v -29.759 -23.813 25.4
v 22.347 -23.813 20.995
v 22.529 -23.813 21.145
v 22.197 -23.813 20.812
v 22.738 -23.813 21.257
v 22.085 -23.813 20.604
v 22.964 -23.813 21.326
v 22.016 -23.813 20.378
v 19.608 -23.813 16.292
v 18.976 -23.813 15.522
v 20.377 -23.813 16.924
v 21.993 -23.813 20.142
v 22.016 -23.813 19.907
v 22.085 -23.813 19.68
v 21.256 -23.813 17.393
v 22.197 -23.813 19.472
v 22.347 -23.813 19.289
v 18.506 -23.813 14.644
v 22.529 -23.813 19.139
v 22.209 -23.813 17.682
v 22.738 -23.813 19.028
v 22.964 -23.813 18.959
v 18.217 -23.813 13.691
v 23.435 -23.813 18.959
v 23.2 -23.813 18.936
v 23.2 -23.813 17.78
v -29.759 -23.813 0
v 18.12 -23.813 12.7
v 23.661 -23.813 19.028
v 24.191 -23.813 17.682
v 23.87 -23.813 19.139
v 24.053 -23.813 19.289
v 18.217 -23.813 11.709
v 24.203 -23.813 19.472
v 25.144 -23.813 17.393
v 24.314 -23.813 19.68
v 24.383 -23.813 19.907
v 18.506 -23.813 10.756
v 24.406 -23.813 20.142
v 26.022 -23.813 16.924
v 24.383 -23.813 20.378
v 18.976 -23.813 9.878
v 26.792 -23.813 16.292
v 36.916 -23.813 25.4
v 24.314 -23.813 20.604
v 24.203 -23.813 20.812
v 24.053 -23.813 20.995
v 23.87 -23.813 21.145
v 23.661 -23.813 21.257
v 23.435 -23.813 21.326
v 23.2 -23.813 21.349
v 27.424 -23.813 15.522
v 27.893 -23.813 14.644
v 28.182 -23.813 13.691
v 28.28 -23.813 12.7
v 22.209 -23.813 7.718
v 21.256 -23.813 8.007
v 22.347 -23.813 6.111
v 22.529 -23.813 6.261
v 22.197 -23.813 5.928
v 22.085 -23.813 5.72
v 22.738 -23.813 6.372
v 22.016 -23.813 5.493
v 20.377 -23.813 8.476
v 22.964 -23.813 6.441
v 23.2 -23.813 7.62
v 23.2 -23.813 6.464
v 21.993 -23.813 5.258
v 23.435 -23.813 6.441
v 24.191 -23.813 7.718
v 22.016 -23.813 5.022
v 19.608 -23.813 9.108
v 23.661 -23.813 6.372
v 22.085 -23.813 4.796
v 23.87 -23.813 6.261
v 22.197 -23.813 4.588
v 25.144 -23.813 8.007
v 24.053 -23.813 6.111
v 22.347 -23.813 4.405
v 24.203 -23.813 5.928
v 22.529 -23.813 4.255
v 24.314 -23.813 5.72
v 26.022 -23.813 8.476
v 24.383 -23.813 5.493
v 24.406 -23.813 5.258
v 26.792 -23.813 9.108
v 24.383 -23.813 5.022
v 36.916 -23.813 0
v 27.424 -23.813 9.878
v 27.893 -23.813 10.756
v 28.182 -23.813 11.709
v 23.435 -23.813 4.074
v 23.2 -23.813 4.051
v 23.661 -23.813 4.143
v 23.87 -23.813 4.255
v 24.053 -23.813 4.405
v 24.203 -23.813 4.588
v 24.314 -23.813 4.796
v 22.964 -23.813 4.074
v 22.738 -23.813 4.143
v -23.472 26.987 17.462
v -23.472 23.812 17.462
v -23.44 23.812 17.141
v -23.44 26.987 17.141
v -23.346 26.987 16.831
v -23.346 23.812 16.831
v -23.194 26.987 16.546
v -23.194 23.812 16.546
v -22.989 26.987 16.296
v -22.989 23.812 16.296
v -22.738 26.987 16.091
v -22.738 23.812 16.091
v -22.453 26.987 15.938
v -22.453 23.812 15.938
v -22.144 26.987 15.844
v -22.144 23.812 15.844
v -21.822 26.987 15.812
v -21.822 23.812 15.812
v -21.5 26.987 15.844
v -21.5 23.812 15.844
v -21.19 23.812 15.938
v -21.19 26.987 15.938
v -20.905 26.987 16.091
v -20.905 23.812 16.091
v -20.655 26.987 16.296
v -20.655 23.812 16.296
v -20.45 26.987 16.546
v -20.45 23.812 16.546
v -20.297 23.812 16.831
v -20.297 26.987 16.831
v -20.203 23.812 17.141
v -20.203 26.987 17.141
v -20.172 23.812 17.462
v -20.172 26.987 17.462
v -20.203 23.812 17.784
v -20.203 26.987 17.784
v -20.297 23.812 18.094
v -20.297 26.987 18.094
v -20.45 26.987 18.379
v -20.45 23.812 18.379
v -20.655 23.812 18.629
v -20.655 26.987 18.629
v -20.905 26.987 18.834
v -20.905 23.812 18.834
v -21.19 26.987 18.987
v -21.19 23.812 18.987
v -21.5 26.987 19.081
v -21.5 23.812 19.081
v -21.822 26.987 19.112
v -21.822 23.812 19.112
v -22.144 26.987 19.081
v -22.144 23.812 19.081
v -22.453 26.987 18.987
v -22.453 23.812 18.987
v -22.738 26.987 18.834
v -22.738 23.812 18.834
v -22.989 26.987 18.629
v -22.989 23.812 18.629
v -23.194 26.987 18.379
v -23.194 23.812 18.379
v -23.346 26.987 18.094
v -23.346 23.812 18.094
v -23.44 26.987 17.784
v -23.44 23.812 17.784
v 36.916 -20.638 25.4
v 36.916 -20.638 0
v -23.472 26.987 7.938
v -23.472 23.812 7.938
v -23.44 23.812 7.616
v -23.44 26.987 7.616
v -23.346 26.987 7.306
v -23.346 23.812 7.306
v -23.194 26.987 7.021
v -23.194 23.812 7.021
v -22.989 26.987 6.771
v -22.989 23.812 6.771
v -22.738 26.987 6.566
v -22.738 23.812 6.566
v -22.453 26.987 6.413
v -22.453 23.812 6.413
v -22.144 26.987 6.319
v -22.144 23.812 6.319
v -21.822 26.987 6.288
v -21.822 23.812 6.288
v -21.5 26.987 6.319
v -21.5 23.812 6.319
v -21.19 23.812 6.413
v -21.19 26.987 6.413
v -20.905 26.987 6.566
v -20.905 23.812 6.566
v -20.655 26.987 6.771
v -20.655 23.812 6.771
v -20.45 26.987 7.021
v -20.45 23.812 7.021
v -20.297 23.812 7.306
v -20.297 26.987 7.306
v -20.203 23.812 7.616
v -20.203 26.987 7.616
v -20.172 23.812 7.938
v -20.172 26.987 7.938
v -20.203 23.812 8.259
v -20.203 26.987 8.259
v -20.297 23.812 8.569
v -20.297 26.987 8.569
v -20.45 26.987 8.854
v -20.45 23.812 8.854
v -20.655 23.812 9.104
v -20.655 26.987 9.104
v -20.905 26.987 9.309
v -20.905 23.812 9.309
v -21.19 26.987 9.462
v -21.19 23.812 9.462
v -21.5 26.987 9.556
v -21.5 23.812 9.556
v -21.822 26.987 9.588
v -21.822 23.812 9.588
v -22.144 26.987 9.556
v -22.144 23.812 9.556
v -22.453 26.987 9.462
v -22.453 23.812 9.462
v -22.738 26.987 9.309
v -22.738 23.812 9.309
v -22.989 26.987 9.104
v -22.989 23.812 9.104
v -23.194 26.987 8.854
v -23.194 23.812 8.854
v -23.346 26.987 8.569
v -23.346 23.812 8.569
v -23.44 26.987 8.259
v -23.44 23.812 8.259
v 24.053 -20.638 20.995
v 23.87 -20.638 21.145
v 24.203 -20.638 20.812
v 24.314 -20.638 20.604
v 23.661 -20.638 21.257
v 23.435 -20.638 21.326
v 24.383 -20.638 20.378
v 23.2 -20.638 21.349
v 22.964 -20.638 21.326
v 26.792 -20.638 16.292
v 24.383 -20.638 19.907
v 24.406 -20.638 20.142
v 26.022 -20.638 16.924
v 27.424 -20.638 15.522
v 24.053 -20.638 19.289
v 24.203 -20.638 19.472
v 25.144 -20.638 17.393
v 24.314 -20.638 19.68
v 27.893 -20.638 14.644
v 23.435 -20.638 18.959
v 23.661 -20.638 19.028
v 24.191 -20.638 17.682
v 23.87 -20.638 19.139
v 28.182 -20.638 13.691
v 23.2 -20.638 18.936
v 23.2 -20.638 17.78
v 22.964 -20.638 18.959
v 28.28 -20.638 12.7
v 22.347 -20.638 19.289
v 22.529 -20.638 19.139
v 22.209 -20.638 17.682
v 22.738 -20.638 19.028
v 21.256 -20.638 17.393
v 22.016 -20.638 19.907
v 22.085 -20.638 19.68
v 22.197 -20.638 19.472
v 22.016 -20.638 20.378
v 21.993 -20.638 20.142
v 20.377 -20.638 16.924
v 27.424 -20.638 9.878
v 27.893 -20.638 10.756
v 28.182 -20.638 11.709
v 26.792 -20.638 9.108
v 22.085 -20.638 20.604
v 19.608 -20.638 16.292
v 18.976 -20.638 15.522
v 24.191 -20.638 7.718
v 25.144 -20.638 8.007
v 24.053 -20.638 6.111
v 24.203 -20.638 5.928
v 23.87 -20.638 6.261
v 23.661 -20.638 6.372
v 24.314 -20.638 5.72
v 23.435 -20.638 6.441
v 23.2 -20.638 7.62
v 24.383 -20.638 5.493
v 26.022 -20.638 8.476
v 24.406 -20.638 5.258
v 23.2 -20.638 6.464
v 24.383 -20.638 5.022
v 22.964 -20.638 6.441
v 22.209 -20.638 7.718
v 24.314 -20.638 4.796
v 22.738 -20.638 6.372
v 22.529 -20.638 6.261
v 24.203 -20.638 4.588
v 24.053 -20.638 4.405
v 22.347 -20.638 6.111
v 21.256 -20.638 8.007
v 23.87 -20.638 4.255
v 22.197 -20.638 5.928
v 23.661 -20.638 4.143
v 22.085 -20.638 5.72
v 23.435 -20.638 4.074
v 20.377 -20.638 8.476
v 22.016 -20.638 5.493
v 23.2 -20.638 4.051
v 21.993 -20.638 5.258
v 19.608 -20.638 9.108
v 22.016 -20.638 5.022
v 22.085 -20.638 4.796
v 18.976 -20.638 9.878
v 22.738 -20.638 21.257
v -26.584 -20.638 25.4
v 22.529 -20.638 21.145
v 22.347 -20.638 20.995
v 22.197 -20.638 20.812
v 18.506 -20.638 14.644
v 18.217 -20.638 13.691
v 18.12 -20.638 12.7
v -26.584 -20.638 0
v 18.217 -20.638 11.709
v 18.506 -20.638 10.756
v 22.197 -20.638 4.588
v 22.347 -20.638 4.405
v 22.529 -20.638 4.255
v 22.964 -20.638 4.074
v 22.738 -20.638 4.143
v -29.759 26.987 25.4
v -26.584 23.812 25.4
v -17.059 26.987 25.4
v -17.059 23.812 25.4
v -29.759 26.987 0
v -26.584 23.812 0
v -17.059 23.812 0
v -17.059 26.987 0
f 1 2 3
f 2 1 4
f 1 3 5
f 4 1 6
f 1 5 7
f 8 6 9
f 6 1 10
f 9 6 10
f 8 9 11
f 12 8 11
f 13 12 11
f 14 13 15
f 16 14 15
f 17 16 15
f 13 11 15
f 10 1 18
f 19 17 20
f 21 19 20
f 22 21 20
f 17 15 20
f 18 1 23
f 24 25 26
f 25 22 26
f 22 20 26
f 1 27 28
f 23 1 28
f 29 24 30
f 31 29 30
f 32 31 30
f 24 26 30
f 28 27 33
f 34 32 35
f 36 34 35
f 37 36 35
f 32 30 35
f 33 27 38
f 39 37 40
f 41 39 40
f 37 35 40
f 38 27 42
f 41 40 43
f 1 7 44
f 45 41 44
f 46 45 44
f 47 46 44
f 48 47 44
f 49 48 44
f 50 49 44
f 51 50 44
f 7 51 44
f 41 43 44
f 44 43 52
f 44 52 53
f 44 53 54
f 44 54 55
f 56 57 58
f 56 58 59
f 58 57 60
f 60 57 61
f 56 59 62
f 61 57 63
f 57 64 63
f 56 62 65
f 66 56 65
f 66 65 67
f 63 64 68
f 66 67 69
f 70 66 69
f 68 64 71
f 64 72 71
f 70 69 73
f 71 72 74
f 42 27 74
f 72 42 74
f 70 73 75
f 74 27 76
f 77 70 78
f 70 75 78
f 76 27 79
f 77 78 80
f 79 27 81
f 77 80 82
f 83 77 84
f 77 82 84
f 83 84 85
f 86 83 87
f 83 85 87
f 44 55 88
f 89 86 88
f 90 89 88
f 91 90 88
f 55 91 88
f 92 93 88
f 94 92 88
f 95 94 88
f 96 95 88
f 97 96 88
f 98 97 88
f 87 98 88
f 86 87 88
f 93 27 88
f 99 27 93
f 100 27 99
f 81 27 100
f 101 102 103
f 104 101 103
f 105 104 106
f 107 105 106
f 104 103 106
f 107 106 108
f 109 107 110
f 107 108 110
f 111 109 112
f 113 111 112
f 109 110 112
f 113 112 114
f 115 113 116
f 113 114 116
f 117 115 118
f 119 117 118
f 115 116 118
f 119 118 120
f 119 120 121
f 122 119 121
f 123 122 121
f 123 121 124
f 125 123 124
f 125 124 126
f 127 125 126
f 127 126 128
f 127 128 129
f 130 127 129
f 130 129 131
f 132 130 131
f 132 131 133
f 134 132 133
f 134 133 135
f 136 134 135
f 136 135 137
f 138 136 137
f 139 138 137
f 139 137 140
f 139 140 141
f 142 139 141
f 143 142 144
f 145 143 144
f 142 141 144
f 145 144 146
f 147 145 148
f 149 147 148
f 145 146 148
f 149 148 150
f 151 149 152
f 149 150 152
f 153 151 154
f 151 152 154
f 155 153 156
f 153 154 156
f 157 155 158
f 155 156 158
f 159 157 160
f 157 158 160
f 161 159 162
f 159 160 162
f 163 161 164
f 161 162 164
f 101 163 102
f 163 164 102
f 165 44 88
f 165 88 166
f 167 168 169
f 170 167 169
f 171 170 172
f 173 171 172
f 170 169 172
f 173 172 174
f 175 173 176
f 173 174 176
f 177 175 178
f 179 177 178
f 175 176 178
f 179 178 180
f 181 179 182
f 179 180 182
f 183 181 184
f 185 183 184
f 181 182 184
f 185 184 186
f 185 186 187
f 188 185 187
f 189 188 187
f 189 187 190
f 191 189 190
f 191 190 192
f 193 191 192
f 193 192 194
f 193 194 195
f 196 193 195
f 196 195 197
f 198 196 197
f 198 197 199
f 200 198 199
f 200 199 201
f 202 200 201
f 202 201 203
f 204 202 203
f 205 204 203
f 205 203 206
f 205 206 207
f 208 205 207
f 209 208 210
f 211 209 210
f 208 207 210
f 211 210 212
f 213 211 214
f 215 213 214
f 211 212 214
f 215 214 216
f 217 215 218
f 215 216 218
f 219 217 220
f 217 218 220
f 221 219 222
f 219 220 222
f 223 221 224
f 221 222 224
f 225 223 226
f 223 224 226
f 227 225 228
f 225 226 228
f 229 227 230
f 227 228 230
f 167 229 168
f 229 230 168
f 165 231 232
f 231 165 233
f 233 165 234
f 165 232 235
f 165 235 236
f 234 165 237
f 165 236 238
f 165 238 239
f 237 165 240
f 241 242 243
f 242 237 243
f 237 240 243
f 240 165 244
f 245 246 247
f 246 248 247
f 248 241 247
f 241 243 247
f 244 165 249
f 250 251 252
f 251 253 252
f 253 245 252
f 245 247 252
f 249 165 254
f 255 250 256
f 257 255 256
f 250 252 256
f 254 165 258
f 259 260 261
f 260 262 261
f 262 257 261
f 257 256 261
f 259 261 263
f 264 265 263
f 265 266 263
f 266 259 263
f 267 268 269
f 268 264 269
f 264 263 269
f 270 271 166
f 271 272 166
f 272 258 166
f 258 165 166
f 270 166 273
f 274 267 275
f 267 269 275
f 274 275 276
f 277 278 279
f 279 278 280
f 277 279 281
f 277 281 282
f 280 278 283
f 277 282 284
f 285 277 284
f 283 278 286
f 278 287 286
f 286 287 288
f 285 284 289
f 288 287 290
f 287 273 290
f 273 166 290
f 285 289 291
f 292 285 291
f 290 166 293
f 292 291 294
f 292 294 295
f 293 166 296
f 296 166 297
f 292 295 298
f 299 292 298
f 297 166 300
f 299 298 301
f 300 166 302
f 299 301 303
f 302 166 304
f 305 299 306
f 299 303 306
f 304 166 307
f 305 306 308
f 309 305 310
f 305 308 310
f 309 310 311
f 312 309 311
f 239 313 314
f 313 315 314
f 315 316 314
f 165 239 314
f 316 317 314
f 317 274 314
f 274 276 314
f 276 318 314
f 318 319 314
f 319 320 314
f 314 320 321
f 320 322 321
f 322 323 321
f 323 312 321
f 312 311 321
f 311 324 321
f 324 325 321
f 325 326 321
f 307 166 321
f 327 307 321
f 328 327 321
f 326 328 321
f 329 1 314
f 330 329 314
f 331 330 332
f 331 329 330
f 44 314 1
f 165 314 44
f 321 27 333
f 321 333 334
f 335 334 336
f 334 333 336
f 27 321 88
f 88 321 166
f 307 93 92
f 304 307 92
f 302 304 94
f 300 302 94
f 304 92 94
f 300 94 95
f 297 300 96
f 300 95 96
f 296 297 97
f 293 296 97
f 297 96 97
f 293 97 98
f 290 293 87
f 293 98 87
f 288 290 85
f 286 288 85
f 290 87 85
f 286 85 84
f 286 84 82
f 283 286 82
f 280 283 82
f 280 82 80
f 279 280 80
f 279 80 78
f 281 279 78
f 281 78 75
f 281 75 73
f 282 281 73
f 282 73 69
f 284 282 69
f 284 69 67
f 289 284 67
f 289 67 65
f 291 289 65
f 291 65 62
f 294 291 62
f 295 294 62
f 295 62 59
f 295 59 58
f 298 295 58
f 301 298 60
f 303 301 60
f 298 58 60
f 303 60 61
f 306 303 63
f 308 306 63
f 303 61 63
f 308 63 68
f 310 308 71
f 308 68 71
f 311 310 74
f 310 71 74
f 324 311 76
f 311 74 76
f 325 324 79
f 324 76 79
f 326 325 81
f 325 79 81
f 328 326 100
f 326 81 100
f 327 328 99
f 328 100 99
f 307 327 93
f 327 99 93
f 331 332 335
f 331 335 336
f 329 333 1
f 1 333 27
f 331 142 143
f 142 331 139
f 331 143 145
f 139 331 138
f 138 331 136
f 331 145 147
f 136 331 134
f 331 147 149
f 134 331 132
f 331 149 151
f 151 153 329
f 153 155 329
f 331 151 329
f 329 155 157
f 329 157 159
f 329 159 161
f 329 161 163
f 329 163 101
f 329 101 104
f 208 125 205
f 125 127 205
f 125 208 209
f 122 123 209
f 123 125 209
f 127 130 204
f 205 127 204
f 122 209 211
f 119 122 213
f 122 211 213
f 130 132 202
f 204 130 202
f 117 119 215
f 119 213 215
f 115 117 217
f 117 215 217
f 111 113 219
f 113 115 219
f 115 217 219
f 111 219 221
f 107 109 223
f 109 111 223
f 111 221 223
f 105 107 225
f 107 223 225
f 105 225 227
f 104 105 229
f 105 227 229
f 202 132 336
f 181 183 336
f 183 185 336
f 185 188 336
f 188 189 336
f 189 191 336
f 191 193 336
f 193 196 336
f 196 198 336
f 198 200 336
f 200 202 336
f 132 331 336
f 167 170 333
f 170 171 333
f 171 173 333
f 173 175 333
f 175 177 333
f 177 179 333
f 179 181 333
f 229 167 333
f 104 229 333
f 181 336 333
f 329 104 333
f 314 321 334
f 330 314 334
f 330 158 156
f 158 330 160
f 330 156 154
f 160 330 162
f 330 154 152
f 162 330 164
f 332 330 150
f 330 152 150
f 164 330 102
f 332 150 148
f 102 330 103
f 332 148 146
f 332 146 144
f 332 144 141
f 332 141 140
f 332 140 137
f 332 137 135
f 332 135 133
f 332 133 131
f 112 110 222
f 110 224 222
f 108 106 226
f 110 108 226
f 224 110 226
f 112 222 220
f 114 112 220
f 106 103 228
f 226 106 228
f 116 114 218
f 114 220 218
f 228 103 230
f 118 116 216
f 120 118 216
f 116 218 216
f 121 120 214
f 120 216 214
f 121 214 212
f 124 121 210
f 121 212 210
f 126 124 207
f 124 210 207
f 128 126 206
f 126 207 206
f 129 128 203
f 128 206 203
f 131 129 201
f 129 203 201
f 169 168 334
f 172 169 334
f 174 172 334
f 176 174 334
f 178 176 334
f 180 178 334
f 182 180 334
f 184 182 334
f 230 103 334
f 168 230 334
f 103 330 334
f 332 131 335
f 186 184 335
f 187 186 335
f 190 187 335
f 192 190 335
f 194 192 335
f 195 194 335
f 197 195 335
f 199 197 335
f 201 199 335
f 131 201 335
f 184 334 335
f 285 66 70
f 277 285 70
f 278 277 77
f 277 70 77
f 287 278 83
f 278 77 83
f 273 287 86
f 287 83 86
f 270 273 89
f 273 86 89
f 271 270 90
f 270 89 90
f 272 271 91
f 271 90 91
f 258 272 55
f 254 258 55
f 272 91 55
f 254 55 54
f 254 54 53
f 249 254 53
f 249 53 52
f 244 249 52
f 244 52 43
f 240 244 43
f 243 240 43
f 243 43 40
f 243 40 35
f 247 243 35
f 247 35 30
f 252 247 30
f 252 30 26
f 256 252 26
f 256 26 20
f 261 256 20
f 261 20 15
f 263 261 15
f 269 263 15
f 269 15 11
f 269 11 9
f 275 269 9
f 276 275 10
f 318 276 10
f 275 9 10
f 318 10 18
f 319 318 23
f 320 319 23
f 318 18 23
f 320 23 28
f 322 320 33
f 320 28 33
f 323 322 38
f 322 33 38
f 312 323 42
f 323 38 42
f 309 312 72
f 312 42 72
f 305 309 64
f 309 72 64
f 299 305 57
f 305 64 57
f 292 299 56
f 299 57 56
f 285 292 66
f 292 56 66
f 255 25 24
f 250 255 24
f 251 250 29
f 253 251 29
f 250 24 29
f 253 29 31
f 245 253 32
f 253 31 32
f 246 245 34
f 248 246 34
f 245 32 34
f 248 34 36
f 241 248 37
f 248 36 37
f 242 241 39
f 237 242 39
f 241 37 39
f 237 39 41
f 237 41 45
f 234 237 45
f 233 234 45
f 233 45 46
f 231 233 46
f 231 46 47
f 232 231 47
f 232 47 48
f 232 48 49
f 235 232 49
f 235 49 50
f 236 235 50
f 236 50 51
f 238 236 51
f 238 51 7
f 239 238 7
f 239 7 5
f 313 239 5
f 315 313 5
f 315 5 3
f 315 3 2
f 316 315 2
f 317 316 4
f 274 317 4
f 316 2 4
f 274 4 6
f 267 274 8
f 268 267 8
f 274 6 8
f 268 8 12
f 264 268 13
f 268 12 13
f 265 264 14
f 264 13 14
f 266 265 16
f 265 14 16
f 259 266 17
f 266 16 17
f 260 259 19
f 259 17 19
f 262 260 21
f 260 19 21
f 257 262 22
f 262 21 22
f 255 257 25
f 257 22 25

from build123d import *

# Parameters (mm, degrees)
BOSS_EXTRUDE1_DEPTH       = 25.4
M4X0_7_TAPPED_HOLE1_D     = 3.3
M4X0_7_TAPPED_HOLE1_DEPTH = 9.906
M4X0_7_TAPPED_HOLE1_TIP   = 0.991420021
CUT_EXTRUDE1_REACH        = 69.739
SKETCH7_R                 = 5.08
SKETCH7_R_2               = 1.2065


with BuildPart() as part:
    # Sketch1 → Boss-Extrude1 (new body)
    with BuildSketch(Plane.XY):
        Polygon((-17.059275079, 26.987213855), (-29.759275079, 26.987213855), (-29.759275079, -23.812786145), (36.915724921, -23.812786145), (36.915724921, -20.637786145), (-26.584275079, -20.637786145), (-26.584275079, 23.812213855), (-17.059275079, 23.812213855), align=None)
    extrude(amount=BOSS_EXTRUDE1_DEPTH)

    # M4x0.7 Tapped Hole1
    with Locations(Plane(origin=(0, 26.987213855, 0), x_dir=(1, 0, 0), z_dir=(0, 1, 0))):
        with Locations((-21.821775079, -7.9375), (-21.821775079, -17.4625)):
            Hole(M4X0_7_TAPPED_HOLE1_D / 2, depth=M4X0_7_TAPPED_HOLE1_DEPTH)
            with Locations((0, 0, -(M4X0_7_TAPPED_HOLE1_DEPTH + M4X0_7_TAPPED_HOLE1_TIP / 2))):  # 118° drill point
                Cone(0, M4X0_7_TAPPED_HOLE1_D / 2, M4X0_7_TAPPED_HOLE1_TIP, mode=Mode.SUBTRACT)

    # Sketch7 → Cut-Extrude1 (cut, up to next)
    with BuildSketch(Plane.XZ.offset(23.812786145), mode=Mode.PRIVATE) as cut_extrude1_sk1:
        with Locations(Location((23.199724921, 12.7, 0), (0, 0, 270))):
            Circle(SKETCH7_R)
    cut_extrude1_tool1 = extrude(cut_extrude1_sk1.sketch, amount=-CUT_EXTRUDE1_REACH, mode=Mode.PRIVATE) & part.part
    # Sketch7 → Cut-Extrude1 (cut, up to next)
    with BuildSketch(Plane.XZ.offset(23.812786145), mode=Mode.PRIVATE) as cut_extrude1_sk2:
        with Locations(Location((23.199724921, 5.2578, 0), (0, 0, 270))):
            Circle(SKETCH7_R_2)
    cut_extrude1_tool2 = extrude(cut_extrude1_sk2.sketch, amount=-CUT_EXTRUDE1_REACH, mode=Mode.PRIVATE) & part.part
    # Sketch7 → Cut-Extrude1 (cut, up to next)
    with BuildSketch(Plane.XZ.offset(23.812786145), mode=Mode.PRIVATE) as cut_extrude1_sk3:
        with Locations(Location((23.199724921, 20.1422, 0), (0, 0, 270))):
            Circle(SKETCH7_R_2)
    cut_extrude1_tool3 = extrude(cut_extrude1_sk3.sketch, amount=-CUT_EXTRUDE1_REACH, mode=Mode.PRIVATE) & part.part
    add(cut_extrude1_tool1.solids().sort_by_distance((23.199725, -23.812786, 12.7))[0], mode=Mode.SUBTRACT)
    add(cut_extrude1_tool2.solids().sort_by_distance((23.199725, -23.812786, 5.2578))[0], mode=Mode.SUBTRACT)
    add(cut_extrude1_tool3.solids().sort_by_distance((23.199725, -23.812786, 20.1422))[0], mode=Mode.SUBTRACT)


solid = part.part
